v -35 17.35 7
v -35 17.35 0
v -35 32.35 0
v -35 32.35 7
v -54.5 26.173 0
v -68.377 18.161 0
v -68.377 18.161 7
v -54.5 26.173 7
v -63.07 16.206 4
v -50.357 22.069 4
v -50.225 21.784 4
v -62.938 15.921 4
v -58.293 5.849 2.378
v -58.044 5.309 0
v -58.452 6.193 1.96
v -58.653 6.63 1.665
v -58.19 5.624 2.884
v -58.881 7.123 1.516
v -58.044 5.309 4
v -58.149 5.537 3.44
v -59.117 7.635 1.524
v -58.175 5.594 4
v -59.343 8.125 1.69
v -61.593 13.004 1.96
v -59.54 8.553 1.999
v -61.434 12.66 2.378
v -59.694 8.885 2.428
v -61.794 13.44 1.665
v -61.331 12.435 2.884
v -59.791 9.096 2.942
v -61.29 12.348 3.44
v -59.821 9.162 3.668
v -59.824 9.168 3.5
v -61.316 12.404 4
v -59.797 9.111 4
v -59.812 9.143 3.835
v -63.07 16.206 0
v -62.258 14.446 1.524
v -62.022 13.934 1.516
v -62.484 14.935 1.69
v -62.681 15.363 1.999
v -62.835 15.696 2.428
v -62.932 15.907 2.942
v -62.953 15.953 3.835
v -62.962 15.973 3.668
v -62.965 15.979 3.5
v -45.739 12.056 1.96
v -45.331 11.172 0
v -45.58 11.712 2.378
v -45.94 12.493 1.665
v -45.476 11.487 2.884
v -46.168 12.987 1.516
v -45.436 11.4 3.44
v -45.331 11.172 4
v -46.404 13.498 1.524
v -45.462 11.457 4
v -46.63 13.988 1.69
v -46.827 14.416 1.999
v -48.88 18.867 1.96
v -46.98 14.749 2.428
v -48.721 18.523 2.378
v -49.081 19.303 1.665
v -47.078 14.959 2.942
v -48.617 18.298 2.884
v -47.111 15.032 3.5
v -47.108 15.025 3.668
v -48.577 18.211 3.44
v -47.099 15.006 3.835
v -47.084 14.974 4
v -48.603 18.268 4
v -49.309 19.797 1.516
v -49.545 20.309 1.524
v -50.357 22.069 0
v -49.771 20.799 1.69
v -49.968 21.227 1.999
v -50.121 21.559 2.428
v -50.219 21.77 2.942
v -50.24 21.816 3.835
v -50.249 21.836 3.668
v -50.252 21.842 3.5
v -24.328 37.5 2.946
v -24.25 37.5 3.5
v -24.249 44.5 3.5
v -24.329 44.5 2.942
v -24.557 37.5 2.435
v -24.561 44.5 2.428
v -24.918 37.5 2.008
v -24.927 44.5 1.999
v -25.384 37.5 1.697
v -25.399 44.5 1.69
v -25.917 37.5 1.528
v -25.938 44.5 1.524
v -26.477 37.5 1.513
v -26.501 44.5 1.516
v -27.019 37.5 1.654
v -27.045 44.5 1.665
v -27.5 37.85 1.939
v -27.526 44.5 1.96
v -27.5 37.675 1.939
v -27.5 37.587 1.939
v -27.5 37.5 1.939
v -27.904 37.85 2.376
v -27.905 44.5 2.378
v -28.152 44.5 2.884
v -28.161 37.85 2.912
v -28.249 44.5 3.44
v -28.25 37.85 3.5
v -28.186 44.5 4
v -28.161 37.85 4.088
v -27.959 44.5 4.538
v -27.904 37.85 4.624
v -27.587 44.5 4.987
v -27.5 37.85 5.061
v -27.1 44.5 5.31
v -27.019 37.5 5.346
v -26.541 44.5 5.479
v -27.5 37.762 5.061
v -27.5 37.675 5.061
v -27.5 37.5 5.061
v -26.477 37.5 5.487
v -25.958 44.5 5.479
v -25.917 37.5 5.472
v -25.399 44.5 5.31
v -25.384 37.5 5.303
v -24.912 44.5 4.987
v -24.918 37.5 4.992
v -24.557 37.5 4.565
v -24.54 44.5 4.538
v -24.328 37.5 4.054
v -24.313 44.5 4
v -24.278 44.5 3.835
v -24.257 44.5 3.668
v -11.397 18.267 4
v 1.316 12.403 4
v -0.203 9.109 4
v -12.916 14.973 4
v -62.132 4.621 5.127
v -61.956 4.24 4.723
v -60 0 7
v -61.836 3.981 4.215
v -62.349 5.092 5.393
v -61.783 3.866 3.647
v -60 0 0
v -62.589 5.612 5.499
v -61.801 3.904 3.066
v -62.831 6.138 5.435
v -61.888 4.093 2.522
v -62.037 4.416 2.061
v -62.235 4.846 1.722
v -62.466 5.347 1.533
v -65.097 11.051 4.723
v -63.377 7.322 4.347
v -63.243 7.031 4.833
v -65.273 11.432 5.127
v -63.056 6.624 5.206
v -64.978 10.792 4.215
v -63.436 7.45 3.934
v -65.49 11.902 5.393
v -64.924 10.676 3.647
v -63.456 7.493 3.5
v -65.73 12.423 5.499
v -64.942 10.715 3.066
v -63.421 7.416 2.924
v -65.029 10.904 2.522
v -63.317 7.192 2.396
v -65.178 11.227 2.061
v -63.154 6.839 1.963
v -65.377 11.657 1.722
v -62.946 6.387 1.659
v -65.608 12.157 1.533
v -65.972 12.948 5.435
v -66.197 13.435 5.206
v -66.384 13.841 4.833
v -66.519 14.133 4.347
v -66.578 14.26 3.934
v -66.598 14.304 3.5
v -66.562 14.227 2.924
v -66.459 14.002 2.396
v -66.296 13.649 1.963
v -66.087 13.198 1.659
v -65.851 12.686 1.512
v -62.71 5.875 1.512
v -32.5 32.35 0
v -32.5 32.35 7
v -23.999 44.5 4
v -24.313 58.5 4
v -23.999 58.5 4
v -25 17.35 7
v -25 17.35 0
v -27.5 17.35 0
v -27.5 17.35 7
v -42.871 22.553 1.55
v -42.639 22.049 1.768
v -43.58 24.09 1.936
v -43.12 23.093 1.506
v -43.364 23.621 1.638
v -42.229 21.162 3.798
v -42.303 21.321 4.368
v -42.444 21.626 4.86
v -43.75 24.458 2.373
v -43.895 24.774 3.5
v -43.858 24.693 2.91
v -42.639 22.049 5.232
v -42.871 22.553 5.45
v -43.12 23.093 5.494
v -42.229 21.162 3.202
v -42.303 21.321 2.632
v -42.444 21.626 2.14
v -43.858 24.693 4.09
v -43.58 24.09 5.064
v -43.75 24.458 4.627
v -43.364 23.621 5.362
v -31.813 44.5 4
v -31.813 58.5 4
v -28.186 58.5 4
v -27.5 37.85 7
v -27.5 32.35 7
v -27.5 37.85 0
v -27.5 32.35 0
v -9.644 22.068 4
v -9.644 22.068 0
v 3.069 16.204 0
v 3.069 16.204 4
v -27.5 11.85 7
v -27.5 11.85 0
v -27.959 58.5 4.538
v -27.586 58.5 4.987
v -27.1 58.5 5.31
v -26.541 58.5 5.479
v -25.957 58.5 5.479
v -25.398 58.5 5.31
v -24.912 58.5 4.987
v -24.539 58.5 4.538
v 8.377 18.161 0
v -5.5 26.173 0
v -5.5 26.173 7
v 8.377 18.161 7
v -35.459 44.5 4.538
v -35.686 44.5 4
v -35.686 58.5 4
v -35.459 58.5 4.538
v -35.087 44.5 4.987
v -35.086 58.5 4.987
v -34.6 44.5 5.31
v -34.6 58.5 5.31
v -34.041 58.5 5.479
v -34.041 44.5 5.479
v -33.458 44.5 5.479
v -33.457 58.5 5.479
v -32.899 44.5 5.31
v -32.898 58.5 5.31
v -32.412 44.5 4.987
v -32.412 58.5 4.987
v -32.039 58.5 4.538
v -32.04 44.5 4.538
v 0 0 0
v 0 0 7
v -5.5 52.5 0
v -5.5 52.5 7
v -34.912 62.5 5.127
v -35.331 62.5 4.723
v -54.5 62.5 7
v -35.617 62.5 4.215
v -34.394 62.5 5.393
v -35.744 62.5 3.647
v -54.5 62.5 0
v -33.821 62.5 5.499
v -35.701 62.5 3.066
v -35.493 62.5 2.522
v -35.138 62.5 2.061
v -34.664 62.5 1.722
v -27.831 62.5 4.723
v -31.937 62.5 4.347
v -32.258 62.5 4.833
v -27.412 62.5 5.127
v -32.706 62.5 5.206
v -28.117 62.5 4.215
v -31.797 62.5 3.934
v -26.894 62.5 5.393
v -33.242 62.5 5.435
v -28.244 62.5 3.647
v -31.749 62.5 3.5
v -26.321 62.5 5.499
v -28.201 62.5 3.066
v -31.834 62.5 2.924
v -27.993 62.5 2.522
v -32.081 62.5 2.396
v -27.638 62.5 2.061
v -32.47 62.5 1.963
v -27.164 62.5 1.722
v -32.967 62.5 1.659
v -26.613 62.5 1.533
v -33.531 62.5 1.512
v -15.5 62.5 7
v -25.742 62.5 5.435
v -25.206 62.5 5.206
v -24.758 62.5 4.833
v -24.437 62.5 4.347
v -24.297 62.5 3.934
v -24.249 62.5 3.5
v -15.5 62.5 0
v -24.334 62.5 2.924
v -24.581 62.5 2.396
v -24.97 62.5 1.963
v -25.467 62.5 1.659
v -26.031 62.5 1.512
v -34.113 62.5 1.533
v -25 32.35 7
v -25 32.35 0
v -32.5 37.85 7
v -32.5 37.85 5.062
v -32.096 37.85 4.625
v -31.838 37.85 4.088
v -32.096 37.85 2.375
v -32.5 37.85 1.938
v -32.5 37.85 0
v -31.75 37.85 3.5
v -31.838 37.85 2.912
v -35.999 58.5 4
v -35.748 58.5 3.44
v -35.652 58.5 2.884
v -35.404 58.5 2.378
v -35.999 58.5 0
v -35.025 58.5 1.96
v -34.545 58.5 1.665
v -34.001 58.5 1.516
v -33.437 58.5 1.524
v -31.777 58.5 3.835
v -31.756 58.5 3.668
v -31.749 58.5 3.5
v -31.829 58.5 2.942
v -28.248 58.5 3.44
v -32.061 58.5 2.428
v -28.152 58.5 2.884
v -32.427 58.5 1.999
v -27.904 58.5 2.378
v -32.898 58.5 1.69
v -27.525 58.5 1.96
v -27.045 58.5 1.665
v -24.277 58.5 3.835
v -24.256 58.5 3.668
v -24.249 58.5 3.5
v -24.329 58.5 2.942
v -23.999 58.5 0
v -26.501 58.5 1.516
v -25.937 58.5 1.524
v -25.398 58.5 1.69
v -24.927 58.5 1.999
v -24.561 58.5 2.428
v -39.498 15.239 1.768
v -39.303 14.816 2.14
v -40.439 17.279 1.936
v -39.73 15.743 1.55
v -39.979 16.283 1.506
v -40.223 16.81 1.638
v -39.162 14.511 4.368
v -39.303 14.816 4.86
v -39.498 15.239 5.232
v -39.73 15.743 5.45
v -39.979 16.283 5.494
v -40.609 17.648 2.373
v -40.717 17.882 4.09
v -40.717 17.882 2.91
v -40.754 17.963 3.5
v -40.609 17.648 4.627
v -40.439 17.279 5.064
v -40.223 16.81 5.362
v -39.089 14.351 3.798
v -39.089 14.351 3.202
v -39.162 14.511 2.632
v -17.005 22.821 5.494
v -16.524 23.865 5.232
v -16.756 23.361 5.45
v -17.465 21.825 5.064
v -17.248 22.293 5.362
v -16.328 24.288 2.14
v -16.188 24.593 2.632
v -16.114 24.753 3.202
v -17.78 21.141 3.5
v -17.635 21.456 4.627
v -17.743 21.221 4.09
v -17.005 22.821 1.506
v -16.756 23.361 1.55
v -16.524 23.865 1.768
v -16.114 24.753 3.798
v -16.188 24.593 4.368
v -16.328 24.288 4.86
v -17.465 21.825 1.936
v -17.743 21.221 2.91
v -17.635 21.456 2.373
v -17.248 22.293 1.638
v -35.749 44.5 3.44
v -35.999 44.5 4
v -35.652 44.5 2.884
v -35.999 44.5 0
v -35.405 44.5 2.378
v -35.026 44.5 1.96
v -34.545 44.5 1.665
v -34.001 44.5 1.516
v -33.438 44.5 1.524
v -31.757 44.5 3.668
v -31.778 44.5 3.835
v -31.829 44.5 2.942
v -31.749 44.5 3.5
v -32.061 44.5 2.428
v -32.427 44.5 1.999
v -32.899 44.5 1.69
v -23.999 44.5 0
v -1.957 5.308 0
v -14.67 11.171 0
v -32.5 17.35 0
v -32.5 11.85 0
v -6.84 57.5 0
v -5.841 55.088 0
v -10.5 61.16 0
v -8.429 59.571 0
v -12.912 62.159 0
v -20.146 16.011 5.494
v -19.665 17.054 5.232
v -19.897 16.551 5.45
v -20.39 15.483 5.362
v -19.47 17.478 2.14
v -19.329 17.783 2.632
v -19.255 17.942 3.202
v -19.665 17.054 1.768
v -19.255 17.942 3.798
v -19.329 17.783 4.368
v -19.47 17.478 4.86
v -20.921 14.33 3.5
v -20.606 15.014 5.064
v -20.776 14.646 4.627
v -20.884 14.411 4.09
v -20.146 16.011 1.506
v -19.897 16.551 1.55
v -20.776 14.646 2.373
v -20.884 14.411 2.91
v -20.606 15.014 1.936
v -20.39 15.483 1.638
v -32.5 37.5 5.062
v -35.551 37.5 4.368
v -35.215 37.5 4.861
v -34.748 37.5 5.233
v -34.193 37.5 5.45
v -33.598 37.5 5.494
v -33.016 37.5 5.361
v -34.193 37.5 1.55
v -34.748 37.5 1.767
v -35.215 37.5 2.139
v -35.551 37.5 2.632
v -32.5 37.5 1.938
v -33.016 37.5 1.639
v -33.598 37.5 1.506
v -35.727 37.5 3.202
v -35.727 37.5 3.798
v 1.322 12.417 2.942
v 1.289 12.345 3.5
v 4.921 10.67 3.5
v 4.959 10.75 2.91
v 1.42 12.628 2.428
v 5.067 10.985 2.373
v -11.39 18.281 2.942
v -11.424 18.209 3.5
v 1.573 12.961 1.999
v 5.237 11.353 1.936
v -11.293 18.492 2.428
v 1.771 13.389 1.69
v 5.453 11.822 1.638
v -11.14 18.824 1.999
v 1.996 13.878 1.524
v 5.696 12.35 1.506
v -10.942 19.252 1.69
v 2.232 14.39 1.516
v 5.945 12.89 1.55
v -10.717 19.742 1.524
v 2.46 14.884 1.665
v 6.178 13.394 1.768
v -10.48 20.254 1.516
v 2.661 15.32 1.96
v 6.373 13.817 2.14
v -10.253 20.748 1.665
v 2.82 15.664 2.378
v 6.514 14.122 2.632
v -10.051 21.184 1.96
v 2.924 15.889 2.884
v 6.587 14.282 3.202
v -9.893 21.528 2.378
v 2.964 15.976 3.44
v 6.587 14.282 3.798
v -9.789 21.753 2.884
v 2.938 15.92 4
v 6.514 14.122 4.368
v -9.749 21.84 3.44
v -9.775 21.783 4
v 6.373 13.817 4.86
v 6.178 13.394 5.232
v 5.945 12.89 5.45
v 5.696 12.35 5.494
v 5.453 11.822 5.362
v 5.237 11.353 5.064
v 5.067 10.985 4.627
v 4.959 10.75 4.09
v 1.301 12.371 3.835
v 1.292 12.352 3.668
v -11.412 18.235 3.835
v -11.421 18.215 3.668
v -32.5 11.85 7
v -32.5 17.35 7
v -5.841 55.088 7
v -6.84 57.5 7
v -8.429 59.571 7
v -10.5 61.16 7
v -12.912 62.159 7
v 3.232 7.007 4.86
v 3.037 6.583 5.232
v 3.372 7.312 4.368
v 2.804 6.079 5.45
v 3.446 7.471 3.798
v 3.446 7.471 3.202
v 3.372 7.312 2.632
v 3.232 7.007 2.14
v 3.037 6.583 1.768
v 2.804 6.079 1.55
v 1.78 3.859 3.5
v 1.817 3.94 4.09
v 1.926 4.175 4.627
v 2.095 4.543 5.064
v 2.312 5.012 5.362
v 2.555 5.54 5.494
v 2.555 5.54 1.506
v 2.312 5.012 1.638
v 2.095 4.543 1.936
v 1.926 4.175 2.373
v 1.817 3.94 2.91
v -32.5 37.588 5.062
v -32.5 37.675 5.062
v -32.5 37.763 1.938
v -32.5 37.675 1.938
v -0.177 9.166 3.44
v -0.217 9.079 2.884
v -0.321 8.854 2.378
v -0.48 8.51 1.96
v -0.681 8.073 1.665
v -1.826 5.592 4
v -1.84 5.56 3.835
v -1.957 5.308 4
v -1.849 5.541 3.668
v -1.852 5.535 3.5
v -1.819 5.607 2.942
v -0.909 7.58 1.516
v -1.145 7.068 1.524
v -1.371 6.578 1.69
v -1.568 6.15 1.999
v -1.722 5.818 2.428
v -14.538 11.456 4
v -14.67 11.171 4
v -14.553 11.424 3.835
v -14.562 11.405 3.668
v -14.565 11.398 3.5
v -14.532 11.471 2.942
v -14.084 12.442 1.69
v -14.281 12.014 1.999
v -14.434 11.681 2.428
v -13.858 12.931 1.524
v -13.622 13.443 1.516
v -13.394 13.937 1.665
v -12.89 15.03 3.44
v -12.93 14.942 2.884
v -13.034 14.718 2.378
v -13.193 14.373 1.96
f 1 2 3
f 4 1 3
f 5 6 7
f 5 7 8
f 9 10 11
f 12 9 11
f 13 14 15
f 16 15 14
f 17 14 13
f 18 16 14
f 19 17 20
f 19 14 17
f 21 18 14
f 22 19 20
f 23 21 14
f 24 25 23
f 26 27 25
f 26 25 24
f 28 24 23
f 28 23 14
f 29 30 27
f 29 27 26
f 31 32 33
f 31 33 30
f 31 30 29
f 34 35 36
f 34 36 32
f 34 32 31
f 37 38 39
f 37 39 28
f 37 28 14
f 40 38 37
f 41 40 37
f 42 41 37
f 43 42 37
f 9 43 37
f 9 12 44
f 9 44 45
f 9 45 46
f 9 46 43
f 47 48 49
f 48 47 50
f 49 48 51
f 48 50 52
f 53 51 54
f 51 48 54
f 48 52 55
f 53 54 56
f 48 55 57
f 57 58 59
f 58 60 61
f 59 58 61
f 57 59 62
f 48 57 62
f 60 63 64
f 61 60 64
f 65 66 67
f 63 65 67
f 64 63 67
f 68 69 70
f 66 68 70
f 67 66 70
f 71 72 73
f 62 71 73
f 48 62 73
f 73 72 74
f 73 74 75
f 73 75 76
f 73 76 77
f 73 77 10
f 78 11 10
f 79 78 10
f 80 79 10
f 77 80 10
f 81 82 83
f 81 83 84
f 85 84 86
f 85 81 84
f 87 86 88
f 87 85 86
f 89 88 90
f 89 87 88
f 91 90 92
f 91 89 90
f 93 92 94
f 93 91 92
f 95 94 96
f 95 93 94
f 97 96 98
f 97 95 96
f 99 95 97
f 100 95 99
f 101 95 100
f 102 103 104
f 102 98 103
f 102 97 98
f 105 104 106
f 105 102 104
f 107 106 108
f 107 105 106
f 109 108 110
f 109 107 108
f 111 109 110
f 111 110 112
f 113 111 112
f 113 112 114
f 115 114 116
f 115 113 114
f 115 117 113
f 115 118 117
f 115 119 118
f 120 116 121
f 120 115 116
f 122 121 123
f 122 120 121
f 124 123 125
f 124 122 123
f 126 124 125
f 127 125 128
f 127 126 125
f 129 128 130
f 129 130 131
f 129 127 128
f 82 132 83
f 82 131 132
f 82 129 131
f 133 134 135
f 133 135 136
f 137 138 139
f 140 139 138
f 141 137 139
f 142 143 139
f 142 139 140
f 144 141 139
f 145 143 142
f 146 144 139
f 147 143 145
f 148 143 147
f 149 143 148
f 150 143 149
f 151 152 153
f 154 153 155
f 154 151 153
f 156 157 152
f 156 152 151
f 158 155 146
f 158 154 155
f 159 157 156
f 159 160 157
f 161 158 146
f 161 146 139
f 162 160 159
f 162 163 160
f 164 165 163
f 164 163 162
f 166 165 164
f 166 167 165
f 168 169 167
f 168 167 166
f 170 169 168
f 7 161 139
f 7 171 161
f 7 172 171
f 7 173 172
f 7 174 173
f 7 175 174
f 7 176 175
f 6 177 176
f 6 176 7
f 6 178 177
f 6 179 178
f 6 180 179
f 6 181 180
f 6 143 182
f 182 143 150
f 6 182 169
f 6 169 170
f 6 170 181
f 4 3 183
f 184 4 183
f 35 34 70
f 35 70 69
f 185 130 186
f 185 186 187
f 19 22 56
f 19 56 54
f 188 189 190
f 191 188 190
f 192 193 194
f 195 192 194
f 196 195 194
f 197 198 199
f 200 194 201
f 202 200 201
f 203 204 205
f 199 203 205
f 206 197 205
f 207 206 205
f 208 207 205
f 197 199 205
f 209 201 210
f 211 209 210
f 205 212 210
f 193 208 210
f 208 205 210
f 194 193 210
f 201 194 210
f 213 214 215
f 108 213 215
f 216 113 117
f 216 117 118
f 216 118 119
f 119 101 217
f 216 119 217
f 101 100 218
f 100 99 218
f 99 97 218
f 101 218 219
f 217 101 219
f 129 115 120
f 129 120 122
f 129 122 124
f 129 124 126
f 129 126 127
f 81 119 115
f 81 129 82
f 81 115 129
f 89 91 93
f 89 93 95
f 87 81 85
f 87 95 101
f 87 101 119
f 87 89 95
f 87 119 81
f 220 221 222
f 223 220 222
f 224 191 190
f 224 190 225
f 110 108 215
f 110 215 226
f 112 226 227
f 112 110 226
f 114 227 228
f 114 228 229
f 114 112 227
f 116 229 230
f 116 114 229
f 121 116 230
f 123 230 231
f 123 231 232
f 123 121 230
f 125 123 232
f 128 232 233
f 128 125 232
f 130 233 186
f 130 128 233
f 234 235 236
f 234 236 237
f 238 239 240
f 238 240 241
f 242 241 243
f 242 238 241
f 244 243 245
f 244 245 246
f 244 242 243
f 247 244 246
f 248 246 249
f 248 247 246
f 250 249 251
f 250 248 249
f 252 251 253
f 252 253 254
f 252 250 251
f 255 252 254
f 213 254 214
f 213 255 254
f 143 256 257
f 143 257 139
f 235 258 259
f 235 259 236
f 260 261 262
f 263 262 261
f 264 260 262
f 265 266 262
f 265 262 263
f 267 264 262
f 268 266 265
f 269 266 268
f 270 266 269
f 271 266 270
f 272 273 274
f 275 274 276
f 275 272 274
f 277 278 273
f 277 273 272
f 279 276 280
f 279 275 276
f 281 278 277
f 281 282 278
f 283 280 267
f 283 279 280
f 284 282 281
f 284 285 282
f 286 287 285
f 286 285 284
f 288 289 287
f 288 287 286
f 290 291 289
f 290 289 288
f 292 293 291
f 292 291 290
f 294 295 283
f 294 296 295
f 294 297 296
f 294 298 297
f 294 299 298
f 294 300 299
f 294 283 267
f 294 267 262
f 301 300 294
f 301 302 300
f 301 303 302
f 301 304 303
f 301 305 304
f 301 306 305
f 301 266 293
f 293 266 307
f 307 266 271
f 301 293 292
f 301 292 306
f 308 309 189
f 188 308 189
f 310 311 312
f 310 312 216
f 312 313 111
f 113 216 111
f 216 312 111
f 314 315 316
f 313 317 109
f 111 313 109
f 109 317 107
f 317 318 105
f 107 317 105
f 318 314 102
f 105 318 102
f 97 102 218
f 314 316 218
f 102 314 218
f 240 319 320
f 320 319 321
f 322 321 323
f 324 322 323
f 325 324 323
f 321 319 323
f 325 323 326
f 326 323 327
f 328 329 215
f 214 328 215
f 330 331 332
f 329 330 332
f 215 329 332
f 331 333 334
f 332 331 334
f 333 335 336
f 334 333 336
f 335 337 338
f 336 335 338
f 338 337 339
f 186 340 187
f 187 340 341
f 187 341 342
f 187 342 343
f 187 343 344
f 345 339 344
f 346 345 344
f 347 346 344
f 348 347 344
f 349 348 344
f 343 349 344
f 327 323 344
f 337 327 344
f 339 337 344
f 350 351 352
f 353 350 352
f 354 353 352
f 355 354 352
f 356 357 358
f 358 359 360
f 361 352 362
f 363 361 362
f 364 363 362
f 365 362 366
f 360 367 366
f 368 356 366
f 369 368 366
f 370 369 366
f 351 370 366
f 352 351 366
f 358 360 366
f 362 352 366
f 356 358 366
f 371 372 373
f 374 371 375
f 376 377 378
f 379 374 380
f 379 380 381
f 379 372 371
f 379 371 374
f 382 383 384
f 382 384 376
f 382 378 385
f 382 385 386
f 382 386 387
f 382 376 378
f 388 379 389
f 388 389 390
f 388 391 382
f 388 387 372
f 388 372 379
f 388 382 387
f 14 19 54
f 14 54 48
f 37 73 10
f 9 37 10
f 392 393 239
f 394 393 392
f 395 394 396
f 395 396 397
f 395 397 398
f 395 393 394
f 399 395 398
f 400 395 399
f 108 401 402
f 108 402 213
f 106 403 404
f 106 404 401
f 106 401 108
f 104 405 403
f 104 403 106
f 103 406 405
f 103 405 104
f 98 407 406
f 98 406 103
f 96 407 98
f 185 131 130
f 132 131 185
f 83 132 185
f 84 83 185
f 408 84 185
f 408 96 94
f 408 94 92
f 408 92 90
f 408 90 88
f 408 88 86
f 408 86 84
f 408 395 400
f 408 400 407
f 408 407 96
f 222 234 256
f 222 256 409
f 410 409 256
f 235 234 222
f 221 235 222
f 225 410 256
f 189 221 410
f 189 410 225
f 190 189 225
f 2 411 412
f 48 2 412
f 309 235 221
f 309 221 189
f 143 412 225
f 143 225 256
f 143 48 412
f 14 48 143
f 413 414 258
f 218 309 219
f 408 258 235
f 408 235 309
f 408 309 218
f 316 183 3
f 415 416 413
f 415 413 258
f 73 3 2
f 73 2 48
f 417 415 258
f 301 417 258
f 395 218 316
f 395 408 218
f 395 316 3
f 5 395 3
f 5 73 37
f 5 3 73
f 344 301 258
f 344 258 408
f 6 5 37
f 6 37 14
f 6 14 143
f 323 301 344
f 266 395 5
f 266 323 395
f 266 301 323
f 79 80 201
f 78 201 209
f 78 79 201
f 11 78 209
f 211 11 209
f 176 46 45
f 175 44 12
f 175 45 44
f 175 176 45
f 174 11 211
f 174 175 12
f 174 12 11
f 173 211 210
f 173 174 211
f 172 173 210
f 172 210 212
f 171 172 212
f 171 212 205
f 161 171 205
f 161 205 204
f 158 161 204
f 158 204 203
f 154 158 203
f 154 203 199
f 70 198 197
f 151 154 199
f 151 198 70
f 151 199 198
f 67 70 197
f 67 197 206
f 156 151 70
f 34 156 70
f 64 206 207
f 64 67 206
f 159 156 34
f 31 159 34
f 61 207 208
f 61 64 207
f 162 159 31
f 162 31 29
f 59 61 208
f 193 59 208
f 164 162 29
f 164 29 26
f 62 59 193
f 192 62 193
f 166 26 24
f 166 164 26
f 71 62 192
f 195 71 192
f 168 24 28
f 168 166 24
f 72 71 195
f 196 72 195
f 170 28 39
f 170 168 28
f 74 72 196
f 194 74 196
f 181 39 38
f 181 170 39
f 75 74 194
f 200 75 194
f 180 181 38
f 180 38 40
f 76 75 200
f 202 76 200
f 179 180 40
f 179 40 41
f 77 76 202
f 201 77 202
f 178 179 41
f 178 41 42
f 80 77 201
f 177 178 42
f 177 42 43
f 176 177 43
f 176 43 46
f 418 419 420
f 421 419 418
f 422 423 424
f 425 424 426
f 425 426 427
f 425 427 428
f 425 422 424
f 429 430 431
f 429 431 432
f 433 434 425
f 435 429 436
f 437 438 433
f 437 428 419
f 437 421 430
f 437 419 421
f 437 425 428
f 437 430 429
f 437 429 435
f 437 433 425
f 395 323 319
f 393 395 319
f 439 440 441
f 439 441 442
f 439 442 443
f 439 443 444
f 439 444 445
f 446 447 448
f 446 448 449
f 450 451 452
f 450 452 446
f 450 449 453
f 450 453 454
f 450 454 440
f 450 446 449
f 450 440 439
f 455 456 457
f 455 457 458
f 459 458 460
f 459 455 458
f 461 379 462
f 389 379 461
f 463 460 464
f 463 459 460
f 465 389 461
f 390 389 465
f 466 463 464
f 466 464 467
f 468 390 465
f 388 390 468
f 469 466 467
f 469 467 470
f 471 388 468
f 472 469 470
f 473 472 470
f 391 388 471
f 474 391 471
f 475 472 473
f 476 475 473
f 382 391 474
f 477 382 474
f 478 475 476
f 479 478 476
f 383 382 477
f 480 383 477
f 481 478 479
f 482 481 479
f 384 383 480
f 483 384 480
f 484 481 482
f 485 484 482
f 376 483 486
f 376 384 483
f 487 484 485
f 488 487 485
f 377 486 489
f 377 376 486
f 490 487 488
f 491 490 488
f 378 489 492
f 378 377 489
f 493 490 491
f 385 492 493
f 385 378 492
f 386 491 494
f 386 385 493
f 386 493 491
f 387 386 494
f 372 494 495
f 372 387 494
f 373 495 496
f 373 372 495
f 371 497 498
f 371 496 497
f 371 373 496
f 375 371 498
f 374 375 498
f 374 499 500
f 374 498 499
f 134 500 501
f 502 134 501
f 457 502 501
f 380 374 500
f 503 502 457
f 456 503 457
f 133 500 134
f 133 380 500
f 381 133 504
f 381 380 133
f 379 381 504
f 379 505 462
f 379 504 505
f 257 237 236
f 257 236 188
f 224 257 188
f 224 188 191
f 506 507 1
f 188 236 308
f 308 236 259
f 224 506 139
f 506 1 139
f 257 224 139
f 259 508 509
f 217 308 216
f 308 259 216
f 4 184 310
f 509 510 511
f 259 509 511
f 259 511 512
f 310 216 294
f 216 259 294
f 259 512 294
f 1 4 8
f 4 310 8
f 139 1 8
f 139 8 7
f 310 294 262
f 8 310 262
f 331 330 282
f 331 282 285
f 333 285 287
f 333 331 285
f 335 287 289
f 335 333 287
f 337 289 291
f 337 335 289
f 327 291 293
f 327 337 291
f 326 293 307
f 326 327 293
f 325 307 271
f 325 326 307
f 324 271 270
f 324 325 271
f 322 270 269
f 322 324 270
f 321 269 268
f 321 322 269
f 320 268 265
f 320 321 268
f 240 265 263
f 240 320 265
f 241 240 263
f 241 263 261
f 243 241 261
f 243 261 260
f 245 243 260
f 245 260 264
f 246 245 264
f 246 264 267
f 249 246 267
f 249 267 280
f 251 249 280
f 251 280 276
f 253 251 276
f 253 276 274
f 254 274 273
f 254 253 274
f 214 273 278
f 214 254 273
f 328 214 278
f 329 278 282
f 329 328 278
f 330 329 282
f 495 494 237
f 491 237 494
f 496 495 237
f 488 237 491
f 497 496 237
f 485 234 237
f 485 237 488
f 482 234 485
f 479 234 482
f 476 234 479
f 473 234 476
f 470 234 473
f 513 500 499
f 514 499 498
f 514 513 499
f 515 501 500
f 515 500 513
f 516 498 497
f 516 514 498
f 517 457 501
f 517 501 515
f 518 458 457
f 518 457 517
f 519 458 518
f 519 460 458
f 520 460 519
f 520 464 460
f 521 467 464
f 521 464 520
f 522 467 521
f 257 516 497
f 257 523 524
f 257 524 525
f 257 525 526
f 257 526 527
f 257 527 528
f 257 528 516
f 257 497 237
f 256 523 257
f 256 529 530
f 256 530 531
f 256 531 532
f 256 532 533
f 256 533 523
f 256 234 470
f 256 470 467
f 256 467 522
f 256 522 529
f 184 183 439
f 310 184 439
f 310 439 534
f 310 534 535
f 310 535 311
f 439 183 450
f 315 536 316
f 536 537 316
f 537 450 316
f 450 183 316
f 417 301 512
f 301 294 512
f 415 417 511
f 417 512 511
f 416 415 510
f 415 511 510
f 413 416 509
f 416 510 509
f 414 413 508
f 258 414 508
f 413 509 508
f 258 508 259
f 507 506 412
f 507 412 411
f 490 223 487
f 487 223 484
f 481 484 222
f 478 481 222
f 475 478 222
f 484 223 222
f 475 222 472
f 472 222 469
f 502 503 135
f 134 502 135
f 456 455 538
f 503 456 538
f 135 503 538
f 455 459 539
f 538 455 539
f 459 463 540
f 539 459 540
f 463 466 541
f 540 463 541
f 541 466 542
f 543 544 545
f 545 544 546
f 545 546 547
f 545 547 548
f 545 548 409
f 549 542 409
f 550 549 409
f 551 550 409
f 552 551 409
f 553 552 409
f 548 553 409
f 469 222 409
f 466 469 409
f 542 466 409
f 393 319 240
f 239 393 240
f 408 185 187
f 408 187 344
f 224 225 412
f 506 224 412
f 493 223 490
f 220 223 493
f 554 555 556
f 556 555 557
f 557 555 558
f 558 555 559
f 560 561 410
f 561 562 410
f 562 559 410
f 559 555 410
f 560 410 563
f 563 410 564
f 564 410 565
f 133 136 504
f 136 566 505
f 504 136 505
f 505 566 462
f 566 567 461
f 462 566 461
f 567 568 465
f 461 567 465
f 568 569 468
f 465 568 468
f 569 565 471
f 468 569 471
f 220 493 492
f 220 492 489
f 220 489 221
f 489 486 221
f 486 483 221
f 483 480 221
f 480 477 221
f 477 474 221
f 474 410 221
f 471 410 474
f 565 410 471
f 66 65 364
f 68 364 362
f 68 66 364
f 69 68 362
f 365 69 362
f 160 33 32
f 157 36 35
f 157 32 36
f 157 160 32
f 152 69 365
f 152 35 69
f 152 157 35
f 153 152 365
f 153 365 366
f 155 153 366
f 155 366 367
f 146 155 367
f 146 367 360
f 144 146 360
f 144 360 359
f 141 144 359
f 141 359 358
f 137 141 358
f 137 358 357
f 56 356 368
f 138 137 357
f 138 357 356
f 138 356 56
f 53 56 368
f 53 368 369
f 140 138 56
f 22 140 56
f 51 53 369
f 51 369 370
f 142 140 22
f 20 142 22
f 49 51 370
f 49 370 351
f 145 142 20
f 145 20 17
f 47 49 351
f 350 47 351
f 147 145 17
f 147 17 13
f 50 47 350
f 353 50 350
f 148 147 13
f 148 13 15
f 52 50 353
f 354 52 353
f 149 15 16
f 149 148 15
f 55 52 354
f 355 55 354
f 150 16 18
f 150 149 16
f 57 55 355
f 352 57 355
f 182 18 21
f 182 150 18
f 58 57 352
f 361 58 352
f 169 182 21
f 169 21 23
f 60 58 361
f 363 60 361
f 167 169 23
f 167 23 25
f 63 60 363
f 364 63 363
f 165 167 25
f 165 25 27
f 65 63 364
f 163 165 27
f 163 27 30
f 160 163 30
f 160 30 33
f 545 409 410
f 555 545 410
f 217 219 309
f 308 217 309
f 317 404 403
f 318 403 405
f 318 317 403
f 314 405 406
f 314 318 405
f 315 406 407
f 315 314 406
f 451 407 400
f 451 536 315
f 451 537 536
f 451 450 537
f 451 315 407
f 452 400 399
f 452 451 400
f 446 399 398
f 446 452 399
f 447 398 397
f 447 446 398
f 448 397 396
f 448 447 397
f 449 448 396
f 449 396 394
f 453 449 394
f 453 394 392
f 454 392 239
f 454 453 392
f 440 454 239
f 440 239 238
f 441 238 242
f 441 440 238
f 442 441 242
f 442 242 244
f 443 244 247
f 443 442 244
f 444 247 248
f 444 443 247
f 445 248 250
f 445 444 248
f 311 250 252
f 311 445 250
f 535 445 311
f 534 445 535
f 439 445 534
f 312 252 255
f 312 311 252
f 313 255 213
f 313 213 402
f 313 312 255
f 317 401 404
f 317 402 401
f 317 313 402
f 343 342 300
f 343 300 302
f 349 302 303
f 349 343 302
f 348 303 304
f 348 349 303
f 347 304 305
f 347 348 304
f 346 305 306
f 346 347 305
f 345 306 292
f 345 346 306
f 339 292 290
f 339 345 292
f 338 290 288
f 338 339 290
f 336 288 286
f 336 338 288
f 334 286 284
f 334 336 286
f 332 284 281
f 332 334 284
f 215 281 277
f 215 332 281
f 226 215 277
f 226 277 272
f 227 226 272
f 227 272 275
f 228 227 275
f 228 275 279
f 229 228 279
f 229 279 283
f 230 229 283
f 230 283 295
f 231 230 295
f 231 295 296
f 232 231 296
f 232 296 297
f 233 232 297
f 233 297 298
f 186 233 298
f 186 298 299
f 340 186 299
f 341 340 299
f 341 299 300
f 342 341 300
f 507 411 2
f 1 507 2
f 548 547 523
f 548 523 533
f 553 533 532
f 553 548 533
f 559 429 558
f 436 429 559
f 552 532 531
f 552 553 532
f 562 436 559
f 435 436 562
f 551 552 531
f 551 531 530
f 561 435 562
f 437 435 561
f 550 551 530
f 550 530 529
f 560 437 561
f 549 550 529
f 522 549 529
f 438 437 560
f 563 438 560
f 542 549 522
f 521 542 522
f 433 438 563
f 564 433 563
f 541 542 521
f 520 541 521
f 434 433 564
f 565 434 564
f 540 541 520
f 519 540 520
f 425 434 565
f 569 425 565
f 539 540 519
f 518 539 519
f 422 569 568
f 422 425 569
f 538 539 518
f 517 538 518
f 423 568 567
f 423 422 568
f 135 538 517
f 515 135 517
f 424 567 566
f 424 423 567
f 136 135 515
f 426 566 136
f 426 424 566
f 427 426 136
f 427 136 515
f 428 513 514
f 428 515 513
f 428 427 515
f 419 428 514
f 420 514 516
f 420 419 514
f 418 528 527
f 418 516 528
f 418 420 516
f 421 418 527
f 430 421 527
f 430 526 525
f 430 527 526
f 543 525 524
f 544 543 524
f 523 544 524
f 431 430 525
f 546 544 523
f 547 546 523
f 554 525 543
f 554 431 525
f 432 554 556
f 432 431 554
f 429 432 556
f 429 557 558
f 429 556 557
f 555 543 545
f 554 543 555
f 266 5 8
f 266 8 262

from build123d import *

# Parameters (mm, degrees)
BOSS_EXTRUDE1_DEPTH     = 7
CUT_EXTRUDE1_START      = -25
SKETCH2_R               = 2
CUT_EXTRUDE1_DEPTH      = 26
CUT_EXTRUDE3_DEPTH      = 7
CUT_EXTRUDE2_DEPTH      = 4
CIRPATTERN2_START       = 44.499207337
CIRPATTERN2_DEPTH       = 14
CIRPATTERN2_START_2     = 37.499207337
CIRPATTERN2_2_OUTLINE_R = 2
CIRPATTERN2_2_DEPTH     = 25.000152039
CIRPATTERN2_START_3     = -50.485397831
CIRPATTERN2_3_DEPTH     = 14
CIRPATTERN2_START_4     = -54.485701834
CIRPATTERN2_4_OUTLINE_R = 2
CIRPATTERN2_4_DEPTH     = 25.000304003
FILLET1_R               = 10


# Read off the part's stored shape, not the designer's step: CirPattern2
with BuildPart() as part:
    # Sketch1 → Boss-Extrude1 (new body)
    with BuildSketch(Plane.XY):
        Polygon((-54.5, 62.5), (-5.5, 62.5), (-5.5, 26.172980381), (8.376844495, 18.161180477), (0, 0), (-60, 0), (-68.376844495, 18.161180477), (-54.5, 26.172980381), align=None)
    extrude(amount=BOSS_EXTRUDE1_DEPTH)

    # Sketch2 → Cut-Extrude1 (cut)
    with BuildSketch(Plane(origin=(0, 0, 0), x_dir=(0, 0, -1), z_dir=(0.9080590238365492, -0.41884222474460864, 0)).offset(CUT_EXTRUDE1_START)):
        with Locations(Location((-3.5, 13.75, 0), (0, 0, 270))):
            Circle(SKETCH2_R)
        with Locations(Location((-3.5, 6.25, 0), (0, 0, 270))):
            Circle(SKETCH2_R)
    extrude(amount=CUT_EXTRUDE1_DEPTH, mode=Mode.SUBTRACT)

    # Sketch7 → Cut-Extrude3 (cut)
    with BuildSketch(Plane(origin=(0, 0, 0), x_dir=(-1, 0, 0), z_dir=(0, 0, -1))):
        Polygon((32.5, 17.35), (35, 17.35), (35, 32.35), (32.5, 32.35), (32.5, 37.85), (27.5, 37.85), (27.5, 32.35), (25, 32.35), (25, 17.35), (27.5, 17.35), (27.5, 11.85), (32.5, 11.85), align=None)
    extrude(amount=-CUT_EXTRUDE3_DEPTH, mode=Mode.SUBTRACT)

    # Sketch5 → Cut-Extrude2 (cut)
    with BuildSketch(Plane(origin=(0, 0, 0), x_dir=(-1, 0, 0), z_dir=(0, 0, -1))):
        Polygon((-3.069239501, 16.20431328), (1.956867196, 5.307604994), (14.66969353, 11.171396141), (9.643586833, 22.068104427), align=None)
    extrude(amount=-CUT_EXTRUDE2_DEPTH, mode=Mode.SUBTRACT)

    # CirPattern2 outline → CirPattern2 (cut)
    with BuildSketch(Plane(origin=(0, 0, 0), x_dir=(0.9999999996509443, -2.6421799769471613e-05, 0), z_dir=(2.642179976947161e-05, 0.9999999996509443, 0)).offset(CIRPATTERN2_START)):
        with BuildLine():
            ThreePointArc((-35.687148244, -4), (-33.750656571, -5.5), (-31.814164898, -4))
            Line((-31.814164898, -4), (-28.187148244, -4))
            ThreePointArc((-28.187148244, -4), (-26.250656571, -5.5), (-24.314164898, -4))
            Line((-24.314164898, -4), (-24.000656571, -4))
            Line((-24.000656571, -4), (-24.000656571, 0))
            Line((-24.000656571, 0), (-36.000656571, 0))
            Line((-36.000656571, 0), (-36.000656571, -4))
            Line((-36.000656571, -4), (-35.687148244, -4))
        make_face()
    extrude(amount=CIRPATTERN2_DEPTH, mode=Mode.SUBTRACT)

    # CirPattern2 2 outline → CirPattern2 2 (cut)
    with BuildSketch(Plane(origin=(0, 0, 0), x_dir=(0.9999999996509443, -2.6421799769471613e-05, 0), z_dir=(2.642179976947161e-05, 0.9999999996509443, 0)).offset(CIRPATTERN2_START_2)):
        with Locations((-33.750656571, -3.5)):
            Circle(CIRPATTERN2_2_OUTLINE_R)
        with Locations((-26.250656571, -3.5)):
            Circle(CIRPATTERN2_2_OUTLINE_R)
    extrude(amount=CIRPATTERN2_2_DEPTH, mode=Mode.SUBTRACT)

    # CirPattern2 3 outline → CirPattern2 3 (cut)
    with BuildSketch(Plane(origin=(0, 0, 0), x_dir=(-0.418794239052402, 0.908081155699489, 0), z_dir=(0.908081155699489, 0.418794239052402, 0)).offset(CIRPATTERN2_START_3)):
        with BuildLine():
            ThreePointArc((33.316135564, 4), (31.379643891, 5.5), (29.443152218, 4))
            Line((29.443152218, 4), (29.129643891, 4))
            Line((29.129643891, 4), (29.129643891, 0))
            Line((29.129643891, 0), (41.129643891, 0))
            Line((41.129643891, 0), (41.129643891, 4))
            Line((41.129643891, 4), (40.816135564, 4))
            ThreePointArc((40.816135564, 4), (38.879643891, 5.5), (36.943152218, 4))
            Line((36.943152218, 4), (33.316135564, 4))
        make_face()
    extrude(amount=CIRPATTERN2_3_DEPTH, mode=Mode.SUBTRACT)

    # CirPattern2 4 outline → CirPattern2 4 (cut)
    with BuildSketch(Plane(origin=(0, 0, 0), x_dir=(-0.418794239052402, 0.908081155699489, 0), z_dir=(0.908081155699489, 0.418794239052402, 0)).offset(CIRPATTERN2_START_4)):
        with Locations((31.379643891, 3.5)):
            Circle(CIRPATTERN2_4_OUTLINE_R)
        with Locations((38.879643891, 3.5)):
            Circle(CIRPATTERN2_4_OUTLINE_R)
    extrude(amount=CIRPATTERN2_4_DEPTH, mode=Mode.SUBTRACT)

    # Fillet1
    fillet1_edges = [part.edges().sort_by_distance(p)[0] for p in [
        (-5.5, 62.5, 3.5),
    ]]
    fillet(fillet1_edges, radius=FILLET1_R)


solid = part.part
